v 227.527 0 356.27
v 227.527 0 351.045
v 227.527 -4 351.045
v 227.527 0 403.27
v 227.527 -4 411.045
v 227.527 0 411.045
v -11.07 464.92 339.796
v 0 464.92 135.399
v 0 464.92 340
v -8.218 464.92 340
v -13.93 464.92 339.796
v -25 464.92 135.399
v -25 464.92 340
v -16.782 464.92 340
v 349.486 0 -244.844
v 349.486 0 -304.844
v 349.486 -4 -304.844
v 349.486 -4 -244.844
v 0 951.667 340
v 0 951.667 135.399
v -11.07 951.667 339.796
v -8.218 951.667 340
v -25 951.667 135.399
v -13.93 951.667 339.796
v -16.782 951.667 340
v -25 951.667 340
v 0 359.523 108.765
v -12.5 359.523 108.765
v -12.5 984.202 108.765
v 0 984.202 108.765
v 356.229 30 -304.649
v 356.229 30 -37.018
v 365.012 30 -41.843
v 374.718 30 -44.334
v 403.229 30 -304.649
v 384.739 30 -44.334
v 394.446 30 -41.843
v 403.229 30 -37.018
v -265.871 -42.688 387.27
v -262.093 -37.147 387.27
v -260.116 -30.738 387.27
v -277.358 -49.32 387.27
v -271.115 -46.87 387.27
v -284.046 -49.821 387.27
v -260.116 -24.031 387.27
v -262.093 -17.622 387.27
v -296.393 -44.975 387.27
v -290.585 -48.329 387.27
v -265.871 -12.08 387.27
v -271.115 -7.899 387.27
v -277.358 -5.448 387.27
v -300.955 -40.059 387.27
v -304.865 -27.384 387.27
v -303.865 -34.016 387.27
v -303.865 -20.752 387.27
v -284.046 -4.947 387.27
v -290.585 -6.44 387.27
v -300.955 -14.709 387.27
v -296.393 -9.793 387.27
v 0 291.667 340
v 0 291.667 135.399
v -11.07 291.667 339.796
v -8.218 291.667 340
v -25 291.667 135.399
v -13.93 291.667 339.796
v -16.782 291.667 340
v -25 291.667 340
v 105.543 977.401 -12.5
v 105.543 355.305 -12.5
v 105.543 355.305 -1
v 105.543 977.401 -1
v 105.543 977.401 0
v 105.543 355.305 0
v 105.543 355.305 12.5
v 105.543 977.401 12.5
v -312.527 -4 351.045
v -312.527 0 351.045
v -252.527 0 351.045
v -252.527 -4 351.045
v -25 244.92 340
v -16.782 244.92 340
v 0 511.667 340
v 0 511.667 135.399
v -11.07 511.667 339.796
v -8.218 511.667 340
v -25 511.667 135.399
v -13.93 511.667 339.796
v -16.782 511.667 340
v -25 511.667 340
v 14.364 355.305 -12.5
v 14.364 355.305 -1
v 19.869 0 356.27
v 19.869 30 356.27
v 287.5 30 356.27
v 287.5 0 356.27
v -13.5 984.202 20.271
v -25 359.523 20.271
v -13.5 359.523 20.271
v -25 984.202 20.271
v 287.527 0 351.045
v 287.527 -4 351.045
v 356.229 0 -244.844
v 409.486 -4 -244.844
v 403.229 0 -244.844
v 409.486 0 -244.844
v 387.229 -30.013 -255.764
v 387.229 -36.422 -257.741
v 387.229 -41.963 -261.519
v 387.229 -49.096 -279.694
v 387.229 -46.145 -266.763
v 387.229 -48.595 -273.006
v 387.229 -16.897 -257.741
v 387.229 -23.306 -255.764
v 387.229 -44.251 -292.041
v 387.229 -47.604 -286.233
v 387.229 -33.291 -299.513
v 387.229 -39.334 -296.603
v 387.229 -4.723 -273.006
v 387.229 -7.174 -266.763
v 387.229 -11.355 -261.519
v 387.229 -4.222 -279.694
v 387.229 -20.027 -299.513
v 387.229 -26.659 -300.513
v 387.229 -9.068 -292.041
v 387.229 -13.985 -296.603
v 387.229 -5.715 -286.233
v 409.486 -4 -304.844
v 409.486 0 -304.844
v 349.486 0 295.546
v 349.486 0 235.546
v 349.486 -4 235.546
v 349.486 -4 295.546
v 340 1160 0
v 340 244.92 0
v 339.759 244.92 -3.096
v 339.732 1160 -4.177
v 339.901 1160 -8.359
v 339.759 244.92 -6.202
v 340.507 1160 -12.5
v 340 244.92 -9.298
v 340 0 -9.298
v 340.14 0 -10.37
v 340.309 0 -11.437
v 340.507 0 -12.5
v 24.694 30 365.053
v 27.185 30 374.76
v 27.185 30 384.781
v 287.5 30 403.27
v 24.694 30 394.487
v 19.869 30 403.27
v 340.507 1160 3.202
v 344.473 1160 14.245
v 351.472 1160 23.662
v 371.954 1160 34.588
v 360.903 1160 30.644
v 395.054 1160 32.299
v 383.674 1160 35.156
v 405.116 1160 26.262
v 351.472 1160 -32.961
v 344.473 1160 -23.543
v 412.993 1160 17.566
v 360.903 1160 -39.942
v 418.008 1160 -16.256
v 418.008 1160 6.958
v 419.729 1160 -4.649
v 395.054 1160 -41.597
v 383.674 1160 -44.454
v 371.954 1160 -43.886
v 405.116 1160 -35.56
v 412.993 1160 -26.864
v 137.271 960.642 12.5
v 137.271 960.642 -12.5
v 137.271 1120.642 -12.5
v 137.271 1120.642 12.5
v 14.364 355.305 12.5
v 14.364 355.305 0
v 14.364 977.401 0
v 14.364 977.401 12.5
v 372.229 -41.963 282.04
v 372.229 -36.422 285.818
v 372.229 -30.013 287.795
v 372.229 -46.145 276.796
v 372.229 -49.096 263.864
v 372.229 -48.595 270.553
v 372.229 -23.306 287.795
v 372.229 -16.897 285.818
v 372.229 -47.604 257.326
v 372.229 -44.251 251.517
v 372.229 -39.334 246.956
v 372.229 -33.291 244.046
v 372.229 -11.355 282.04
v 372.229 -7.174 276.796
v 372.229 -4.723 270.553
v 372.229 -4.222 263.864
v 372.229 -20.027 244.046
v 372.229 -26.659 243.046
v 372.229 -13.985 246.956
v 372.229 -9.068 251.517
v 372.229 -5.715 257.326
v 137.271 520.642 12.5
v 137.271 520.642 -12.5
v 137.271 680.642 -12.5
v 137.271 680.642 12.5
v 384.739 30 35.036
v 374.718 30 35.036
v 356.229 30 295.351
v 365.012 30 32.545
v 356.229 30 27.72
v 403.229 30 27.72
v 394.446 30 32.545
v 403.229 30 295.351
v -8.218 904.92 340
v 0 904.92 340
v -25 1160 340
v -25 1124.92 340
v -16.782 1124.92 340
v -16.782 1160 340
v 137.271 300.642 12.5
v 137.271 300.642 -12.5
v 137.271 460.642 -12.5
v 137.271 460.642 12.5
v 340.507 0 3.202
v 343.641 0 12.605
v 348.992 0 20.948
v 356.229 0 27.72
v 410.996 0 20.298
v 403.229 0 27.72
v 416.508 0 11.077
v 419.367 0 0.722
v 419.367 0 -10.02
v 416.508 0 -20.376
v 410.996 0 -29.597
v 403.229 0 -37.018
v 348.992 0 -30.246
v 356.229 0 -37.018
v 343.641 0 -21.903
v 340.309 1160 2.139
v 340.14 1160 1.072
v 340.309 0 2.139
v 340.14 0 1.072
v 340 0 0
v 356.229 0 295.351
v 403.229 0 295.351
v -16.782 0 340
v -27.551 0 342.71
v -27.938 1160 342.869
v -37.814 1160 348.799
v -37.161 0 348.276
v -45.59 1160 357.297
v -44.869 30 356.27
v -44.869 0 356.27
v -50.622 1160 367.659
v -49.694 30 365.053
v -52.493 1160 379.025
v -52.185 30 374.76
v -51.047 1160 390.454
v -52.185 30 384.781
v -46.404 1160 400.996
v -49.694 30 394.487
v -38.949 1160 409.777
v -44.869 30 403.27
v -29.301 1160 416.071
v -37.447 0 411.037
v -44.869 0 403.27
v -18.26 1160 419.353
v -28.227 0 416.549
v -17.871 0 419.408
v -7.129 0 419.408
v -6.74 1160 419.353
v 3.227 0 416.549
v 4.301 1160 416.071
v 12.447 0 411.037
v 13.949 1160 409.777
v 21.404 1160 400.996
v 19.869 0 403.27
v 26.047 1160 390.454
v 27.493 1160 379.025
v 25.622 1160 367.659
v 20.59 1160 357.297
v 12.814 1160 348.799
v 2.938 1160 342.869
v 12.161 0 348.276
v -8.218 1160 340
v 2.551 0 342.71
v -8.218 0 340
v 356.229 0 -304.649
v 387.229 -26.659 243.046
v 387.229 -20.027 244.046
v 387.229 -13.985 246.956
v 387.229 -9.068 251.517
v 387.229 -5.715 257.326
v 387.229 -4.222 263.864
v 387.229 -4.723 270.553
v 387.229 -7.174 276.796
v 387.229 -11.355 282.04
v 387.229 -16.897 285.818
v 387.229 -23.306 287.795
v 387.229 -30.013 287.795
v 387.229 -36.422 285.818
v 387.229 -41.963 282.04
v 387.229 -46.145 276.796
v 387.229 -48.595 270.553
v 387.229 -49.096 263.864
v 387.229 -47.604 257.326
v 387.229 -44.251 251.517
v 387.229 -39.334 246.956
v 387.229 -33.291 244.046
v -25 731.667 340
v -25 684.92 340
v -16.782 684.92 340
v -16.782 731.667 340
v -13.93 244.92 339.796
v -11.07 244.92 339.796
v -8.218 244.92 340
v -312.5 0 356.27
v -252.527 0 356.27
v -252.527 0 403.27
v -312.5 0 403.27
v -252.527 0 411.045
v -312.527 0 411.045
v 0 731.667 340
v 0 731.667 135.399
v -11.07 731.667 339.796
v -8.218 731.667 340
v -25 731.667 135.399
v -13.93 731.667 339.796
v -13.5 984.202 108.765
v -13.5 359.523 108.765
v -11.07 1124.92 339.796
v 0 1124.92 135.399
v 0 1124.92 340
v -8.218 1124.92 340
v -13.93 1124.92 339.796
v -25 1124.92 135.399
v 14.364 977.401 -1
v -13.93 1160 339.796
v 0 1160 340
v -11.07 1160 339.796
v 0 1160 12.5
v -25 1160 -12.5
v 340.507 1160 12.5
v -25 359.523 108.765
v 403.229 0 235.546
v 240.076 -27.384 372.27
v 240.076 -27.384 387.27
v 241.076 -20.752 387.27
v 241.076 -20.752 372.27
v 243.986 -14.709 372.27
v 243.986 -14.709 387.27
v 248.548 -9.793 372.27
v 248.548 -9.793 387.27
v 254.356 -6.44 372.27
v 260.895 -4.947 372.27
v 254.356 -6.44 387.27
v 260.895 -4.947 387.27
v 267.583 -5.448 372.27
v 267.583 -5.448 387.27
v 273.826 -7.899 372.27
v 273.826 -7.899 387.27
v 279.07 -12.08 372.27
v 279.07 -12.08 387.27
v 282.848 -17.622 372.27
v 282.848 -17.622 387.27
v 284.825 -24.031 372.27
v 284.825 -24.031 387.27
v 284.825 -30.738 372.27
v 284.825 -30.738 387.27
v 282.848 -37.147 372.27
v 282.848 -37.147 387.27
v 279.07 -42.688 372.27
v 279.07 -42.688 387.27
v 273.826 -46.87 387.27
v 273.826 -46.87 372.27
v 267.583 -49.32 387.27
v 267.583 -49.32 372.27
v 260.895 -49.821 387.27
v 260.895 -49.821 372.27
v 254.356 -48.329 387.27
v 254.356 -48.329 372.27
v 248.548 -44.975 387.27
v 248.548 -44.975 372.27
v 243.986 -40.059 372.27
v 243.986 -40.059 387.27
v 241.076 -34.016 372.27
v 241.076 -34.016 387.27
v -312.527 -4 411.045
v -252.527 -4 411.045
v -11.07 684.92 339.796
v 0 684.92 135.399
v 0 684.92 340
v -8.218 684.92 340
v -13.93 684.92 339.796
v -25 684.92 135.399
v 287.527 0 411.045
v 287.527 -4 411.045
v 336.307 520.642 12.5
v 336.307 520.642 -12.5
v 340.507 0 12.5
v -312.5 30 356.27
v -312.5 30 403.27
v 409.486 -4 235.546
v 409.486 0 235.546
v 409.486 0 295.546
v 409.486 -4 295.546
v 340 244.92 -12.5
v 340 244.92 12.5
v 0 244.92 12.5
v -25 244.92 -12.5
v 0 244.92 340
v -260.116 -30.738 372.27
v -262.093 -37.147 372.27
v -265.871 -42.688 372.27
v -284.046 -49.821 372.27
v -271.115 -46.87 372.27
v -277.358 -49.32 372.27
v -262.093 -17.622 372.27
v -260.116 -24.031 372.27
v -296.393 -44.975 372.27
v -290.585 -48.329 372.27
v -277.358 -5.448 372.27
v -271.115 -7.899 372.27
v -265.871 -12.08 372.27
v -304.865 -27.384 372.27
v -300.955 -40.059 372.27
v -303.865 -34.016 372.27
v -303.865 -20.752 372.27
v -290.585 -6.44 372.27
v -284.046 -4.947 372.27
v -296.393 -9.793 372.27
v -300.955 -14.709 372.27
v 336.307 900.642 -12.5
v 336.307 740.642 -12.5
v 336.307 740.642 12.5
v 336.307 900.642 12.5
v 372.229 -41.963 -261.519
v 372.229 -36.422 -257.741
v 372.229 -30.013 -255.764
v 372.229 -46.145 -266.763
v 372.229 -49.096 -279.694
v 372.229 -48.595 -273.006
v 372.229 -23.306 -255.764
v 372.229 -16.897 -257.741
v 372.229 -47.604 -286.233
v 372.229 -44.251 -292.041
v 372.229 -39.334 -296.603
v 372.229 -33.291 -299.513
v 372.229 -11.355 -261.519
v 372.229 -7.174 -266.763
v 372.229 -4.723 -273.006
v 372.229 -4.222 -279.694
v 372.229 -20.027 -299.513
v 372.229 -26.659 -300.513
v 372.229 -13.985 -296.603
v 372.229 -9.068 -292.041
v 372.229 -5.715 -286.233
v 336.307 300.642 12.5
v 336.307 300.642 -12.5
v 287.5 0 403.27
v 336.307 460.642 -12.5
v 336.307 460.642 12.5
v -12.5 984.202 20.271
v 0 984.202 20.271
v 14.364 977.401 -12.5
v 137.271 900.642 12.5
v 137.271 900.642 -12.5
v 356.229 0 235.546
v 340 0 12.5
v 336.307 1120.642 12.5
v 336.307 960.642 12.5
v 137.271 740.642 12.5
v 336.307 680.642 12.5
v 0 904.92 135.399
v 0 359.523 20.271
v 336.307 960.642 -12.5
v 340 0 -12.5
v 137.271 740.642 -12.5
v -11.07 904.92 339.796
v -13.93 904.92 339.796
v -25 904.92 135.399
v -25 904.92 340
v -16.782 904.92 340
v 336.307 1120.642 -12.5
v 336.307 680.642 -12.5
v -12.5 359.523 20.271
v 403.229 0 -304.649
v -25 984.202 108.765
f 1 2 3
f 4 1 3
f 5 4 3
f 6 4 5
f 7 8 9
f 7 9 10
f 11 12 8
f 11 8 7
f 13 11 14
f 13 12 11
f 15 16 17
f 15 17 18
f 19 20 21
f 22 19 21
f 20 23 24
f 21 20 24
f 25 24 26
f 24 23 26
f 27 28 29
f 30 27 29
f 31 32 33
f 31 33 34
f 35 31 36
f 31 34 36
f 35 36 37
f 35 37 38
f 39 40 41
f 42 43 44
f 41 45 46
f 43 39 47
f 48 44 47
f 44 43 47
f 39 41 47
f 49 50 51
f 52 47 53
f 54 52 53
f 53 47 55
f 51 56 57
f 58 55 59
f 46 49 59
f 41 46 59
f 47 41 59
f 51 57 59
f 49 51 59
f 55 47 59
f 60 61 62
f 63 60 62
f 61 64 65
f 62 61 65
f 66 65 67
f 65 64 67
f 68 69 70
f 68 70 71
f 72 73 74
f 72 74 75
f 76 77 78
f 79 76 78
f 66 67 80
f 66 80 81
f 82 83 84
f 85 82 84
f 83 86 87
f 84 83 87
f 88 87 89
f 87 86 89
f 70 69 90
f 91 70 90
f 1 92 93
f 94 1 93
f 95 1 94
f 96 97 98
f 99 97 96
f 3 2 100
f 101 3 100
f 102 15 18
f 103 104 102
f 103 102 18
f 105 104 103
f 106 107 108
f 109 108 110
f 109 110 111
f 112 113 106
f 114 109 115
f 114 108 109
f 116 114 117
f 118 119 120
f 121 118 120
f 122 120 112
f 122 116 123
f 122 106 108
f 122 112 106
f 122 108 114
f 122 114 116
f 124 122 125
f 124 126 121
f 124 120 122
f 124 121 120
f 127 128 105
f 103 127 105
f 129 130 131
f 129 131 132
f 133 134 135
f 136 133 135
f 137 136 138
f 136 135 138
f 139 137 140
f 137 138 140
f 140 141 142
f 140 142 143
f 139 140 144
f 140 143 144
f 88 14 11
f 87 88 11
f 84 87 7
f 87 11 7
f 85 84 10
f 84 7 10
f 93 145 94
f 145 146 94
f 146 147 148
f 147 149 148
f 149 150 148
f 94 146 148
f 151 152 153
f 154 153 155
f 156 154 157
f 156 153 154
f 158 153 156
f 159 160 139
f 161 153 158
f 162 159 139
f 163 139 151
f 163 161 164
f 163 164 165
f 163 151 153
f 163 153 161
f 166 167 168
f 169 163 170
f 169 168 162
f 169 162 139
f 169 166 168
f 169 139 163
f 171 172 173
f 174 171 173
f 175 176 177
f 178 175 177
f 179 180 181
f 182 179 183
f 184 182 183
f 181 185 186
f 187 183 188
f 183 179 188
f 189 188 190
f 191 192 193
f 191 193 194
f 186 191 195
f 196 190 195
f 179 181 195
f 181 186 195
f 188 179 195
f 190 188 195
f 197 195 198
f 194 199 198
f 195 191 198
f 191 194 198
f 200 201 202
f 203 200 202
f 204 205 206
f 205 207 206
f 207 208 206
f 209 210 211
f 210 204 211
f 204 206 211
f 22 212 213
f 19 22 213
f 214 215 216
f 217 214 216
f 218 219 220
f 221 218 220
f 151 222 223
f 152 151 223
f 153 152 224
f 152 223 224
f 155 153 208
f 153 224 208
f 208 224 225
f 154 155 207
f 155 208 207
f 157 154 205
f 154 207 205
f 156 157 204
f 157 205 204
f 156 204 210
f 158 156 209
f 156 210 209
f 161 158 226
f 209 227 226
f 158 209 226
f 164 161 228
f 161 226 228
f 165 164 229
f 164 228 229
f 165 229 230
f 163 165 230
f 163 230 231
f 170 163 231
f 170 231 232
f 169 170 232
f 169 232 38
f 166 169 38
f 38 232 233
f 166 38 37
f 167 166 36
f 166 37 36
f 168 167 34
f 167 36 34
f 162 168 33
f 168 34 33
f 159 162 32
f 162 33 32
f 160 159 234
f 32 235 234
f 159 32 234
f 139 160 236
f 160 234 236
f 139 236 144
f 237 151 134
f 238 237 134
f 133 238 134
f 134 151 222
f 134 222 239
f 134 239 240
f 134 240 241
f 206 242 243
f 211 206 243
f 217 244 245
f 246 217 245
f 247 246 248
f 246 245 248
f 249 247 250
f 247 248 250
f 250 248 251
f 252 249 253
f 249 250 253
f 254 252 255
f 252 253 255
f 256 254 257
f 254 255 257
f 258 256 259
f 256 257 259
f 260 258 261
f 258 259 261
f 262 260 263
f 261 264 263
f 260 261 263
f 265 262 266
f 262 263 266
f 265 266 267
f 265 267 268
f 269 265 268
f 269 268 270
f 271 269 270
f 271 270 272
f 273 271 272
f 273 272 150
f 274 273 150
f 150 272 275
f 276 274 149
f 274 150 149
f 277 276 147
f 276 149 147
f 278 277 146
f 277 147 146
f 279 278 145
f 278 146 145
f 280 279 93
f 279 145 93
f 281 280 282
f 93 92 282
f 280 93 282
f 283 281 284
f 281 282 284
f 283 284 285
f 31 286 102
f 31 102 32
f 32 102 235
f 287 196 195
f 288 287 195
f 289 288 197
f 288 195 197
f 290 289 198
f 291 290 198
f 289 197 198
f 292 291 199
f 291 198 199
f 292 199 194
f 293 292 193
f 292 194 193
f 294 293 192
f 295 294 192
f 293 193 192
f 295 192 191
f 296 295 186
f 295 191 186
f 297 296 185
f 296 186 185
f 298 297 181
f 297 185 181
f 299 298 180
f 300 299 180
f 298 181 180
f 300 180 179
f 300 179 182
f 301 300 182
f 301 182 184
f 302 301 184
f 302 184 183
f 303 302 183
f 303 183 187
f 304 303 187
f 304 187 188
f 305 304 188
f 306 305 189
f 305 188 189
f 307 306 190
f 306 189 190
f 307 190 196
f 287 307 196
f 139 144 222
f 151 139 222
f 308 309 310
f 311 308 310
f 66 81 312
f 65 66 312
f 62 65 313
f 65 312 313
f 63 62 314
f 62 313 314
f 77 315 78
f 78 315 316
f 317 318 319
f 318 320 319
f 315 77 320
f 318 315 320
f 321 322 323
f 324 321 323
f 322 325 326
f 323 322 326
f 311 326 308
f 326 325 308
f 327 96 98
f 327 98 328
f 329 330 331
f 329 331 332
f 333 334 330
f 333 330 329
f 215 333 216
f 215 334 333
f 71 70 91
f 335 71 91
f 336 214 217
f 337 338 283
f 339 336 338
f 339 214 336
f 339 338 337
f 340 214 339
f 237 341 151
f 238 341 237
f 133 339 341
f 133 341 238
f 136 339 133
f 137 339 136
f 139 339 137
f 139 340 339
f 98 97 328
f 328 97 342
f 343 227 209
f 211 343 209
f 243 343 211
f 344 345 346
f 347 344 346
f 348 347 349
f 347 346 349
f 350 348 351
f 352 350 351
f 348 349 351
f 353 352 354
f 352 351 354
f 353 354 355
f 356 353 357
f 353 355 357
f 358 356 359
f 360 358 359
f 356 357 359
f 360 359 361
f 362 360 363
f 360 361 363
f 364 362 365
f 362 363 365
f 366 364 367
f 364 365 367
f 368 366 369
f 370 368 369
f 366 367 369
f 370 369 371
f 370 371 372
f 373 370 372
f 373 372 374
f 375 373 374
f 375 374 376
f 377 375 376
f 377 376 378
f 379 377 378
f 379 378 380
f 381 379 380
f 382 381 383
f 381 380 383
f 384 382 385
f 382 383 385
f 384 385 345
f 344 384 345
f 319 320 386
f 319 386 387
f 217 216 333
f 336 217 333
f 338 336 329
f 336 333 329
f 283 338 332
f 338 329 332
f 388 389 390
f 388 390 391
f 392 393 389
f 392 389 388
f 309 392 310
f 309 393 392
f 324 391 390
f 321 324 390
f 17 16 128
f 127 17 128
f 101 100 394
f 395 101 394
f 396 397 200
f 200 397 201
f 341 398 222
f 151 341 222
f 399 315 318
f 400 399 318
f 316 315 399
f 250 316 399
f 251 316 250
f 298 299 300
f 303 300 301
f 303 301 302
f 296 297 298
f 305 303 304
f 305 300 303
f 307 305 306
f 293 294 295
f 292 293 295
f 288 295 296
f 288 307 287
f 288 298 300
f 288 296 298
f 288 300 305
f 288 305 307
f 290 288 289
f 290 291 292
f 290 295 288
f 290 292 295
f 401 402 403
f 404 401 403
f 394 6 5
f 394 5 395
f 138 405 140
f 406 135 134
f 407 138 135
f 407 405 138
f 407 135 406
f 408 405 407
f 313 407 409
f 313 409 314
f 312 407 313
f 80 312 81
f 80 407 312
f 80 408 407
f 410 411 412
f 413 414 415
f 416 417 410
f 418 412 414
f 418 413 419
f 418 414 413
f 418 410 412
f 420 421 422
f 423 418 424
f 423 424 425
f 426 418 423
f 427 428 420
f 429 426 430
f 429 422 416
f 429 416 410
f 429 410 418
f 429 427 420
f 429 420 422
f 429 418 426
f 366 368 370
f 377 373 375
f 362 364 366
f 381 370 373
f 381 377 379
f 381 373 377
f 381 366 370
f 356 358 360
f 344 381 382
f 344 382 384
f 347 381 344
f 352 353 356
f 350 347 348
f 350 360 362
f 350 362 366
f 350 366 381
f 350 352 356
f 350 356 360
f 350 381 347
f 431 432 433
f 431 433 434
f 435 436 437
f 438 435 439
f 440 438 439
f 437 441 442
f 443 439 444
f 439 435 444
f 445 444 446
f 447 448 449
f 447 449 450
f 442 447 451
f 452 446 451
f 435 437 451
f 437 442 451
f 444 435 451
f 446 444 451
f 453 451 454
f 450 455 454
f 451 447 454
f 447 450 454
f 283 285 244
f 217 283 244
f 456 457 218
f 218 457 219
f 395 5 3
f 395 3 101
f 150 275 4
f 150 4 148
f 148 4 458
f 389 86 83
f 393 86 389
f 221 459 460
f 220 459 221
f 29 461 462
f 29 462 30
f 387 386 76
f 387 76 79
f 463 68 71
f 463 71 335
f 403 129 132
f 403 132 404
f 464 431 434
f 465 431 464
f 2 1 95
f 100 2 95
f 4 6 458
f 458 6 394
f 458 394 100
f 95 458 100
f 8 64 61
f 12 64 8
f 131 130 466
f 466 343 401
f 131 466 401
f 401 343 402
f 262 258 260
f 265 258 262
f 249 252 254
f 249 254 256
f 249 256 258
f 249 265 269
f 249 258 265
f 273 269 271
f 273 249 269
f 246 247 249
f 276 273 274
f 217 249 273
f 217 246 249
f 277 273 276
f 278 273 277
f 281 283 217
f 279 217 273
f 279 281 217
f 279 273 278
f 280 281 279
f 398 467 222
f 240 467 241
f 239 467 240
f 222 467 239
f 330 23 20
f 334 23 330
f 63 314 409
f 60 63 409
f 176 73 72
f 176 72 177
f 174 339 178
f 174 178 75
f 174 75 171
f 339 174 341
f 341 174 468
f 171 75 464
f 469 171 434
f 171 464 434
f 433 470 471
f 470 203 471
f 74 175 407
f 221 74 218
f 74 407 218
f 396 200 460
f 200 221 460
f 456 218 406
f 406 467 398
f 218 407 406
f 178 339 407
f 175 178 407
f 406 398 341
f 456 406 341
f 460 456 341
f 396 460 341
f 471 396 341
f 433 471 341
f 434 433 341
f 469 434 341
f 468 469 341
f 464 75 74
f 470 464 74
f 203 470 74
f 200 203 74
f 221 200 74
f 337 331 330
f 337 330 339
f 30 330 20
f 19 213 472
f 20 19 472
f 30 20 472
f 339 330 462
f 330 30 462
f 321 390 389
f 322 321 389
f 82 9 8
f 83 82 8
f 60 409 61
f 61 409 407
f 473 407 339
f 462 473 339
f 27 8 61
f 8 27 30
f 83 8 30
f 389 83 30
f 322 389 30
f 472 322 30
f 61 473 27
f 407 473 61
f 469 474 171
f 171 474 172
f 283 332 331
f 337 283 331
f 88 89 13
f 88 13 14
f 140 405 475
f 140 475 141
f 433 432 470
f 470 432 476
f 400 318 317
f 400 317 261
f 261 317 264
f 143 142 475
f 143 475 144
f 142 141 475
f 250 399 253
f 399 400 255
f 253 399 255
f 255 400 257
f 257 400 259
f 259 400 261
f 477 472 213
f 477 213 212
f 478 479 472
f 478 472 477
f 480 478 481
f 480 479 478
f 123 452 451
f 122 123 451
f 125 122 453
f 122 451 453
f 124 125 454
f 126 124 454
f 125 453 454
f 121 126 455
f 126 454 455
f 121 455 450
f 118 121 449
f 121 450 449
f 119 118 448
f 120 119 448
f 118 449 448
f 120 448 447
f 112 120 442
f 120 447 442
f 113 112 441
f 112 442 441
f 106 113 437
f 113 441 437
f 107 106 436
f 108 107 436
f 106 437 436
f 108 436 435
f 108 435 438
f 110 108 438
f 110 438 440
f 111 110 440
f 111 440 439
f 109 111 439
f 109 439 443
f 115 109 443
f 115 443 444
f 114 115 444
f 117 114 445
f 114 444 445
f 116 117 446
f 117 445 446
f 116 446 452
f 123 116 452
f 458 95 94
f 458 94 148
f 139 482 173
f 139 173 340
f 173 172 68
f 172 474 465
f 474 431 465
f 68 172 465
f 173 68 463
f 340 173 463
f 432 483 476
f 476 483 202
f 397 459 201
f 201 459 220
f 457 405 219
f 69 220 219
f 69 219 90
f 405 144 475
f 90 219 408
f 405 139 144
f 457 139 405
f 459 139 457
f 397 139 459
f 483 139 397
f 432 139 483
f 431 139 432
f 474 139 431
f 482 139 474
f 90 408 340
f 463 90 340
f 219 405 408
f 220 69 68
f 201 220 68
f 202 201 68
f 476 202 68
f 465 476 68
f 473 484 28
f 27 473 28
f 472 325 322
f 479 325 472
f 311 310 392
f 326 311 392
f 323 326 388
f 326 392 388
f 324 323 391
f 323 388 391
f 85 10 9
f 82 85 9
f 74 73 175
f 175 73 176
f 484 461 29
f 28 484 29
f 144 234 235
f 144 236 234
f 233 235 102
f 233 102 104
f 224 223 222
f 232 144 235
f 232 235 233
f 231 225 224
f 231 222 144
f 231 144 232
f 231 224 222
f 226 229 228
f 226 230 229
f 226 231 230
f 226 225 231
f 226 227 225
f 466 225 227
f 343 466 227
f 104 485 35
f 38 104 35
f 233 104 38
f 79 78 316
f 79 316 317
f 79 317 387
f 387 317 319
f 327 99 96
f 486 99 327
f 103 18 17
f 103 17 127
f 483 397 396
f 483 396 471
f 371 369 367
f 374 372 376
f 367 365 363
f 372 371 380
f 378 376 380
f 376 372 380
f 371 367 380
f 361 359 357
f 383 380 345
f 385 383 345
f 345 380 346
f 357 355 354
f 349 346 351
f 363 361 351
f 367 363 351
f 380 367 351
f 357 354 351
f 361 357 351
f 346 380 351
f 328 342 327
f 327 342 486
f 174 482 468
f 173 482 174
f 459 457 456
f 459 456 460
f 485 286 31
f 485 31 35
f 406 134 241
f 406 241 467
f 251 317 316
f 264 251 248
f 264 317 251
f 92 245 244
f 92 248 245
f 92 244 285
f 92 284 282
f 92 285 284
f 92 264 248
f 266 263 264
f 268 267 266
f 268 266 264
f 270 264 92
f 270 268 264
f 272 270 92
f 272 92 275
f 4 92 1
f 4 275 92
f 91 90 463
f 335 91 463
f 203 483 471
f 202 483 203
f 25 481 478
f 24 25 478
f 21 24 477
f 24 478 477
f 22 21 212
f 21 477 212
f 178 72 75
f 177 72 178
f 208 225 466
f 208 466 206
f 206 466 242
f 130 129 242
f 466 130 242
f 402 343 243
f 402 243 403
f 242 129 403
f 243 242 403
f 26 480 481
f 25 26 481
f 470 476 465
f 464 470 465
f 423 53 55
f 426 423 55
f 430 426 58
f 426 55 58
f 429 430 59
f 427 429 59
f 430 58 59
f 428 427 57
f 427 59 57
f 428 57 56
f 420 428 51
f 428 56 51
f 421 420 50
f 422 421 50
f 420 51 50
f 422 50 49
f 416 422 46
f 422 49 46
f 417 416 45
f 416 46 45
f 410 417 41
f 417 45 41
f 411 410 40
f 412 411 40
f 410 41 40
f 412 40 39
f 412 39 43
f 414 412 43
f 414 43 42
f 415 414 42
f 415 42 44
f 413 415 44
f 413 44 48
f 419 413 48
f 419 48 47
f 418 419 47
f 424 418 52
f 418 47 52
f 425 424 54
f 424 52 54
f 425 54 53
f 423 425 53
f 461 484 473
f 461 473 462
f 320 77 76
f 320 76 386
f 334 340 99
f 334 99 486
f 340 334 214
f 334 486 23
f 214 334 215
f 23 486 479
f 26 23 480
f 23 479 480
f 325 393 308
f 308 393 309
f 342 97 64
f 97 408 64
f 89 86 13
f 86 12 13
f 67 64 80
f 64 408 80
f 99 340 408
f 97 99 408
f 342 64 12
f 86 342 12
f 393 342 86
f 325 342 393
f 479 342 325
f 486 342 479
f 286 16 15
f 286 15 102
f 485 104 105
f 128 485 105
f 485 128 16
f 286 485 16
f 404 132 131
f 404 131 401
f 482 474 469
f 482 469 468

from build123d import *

# Parameters (mm, degrees)
SALIENTE_EXTRUIR1_DEPTH        = 1160
SALIENTE_EXTRUIR1_2_DEPTH      = 1160
SALIENTE_EXTRUIR1_3_DEPTH      = 1160
CROQUIS2_W                     = 204.601269718
CROQUIS2_H                     = 173.253526092
CORTAR_EXTRUIR1_DEPTH          = 150
MATRIZL1_COUNT                 = 5
MATRIZL1_PITCH                 = 220
CROQUIS3_W                     = 88.493917932
CROQUIS3_H                     = 624.678517467
CORTAR_EXTRUIR3_DEPTH          = 150
CROQUIS4_W                     = 91.178394865
CROQUIS4_H                     = 622.095660422
CORTAR_EXTRUIR4_DEPTH          = 150
CROQUIS5_W                     = 352.5
CROQUIS5_H                     = 244.920139752
CORTAR_EXTRUIR5_DEPTH          = 365
CROQUIS6_W                     = 199.035720847
CROQUIS6_H                     = 160
CORTAR_EXTRUIR6_DEPTH          = 365
MATRIZL2_COUNT                 = 4
MATRIZL2_PITCH                 = 220
CROQUIS7_W                     = 91.178394865
CROQUIS7_H                     = 622.095660422
SALIENTE_EXTRUIR2_DEPTH        = 1
CROQUIS8_W                     = 88.493917932
CROQUIS8_H                     = 624.678517467
SALIENTE_EXTRUIR3_DEPTH        = 1
CROQUIS9_W                     = 47
CROQUIS9_H                     = 600
CROQUIS9_W_2                   = 600
CROQUIS9_H_2                   = 47
SALIENTE_EXTRUIR4_DEPTH        = 30
CROQUIS10_W                    = 60
CROQUIS10_H                    = 60
SALIENTE_EXTRUIR5_DEPTH        = 4
SALIENTE_EXTRUIR6_DEPTH        = 7.5
SALIENTE_EXTRUIR6_DEPTH_BACK   = 7.5
CROQUIS11_R                    = 22.5
SALIENTE_EXTRUIR6_2_DEPTH      = 7.5
SALIENTE_EXTRUIR6_2_DEPTH_BACK = 7.5
SALIENTE_EXTRUIR7_DEPTH        = 7.5
SALIENTE_EXTRUIR7_DEPTH_BACK   = 7.5
CROQUIS12_R                    = 22.5
SALIENTE_EXTRUIR7_2_DEPTH      = 7.5
SALIENTE_EXTRUIR7_2_DEPTH_BACK = 7.5


with BuildPart() as part:
    # Croquis1 → Saliente-Extruir1 (new body)
    with BuildSketch(Plane(origin=(0, 0, 0), x_dir=(1, 0, 0), z_dir=(0, 1, 0))):
        with BuildLine():
            Line((0, -340), (0, -12.5))
            Line((0, -12.5), (340.50692706, -12.5))
            Line((340.50692706, -12.5), (340.50692706, -3.20178703))
            ThreePointArc((340.50692706, -3.20178703), (340.221015416, -1.606030904), (340, 0))
            ThreePointArc((340, 0), (339.761756236, 6.269940779), (340.50692706, 12.5))
            Line((340.50692706, 12.5), (-25, 12.5))
            Line((-25, 12.5), (-25, -340))
            Line((-25, -340), (-16.782024574, -340))
            ThreePointArc((-16.782024574, -340), (-12.5, -339.770142891), (-8.217975426, -340))
            Line((-8.217975426, -340), (0, -340))
        make_face()
    extrude(amount=SALIENTE_EXTRUIR1_DEPTH)

    # Croquis2 → Cortar-Extruir1 (cut)
    with BuildSketch(Plane.ZY.offset(25)):
        with Locations((237.699365141, 1038.293376706)):
            Rectangle(CROQUIS2_W, CROQUIS2_H)
    cortar_extruir1 = extrude(amount=-CORTAR_EXTRUIR1_DEPTH, mode=Mode.SUBTRACT)

    # MatrizL1: Cortar-Extruir1 ×5
    with Locations(*[(0, -i * MATRIZL1_PITCH, 0) for i in range(1, MATRIZL1_COUNT)]):
        add(cortar_extruir1, mode=Mode.SUBTRACT)

    # Croquis3 → Cortar-Extruir3 (cut)
    with BuildSketch(Plane.ZY.offset(25)):
        with Locations((64.518154315, 671.862661026)):
            Rectangle(CROQUIS3_W, CROQUIS3_H)
    extrude(amount=-CORTAR_EXTRUIR3_DEPTH, mode=Mode.SUBTRACT)

    # Croquis4 → Cortar-Extruir4 (cut)
    with BuildSketch(Plane(origin=(0, 0, -12.5), x_dir=(-1, 0, 0), z_dir=(0, 0, -1))):
        with Locations((-59.953539945, 666.353095055)):
            Rectangle(CROQUIS4_W, CROQUIS4_H)
    extrude(amount=-CORTAR_EXTRUIR4_DEPTH, mode=Mode.SUBTRACT)

    # Croquis5 → Cortar-Extruir5 (cut)
    with BuildSketch(Plane.ZY.offset(25)):
        with Locations((163.75, 122.460069876)):
            Rectangle(CROQUIS5_W, CROQUIS5_H)
    extrude(amount=-CORTAR_EXTRUIR5_DEPTH, mode=Mode.SUBTRACT)

    # Croquis6 → Cortar-Extruir6 (cut)
    with BuildSketch(Plane(origin=(0, 0, -12.5), x_dir=(-1, 0, 0), z_dir=(0, 0, -1))):
        with Locations((-236.788797545, 1040.641633994)):
            Rectangle(CROQUIS6_W, CROQUIS6_H)
    cortar_extruir6 = extrude(amount=-CORTAR_EXTRUIR6_DEPTH, mode=Mode.SUBTRACT)

    # MatrizL2: Cortar-Extruir6 ×4
    with Locations(*[(0, -i * MATRIZL2_PITCH, 0) for i in range(1, MATRIZL2_COUNT)]):
        add(cortar_extruir6, mode=Mode.SUBTRACT)

    # Croquis7 → Saliente-Extruir2 (add)
    with BuildSketch(Plane(origin=(0, 0, 0), x_dir=(-1, 0, 0), z_dir=(0, 0, -1))):
        with Locations((-59.953539945, 666.353095055)):
            Rectangle(CROQUIS7_W, CROQUIS7_H)
    extrude(amount=SALIENTE_EXTRUIR2_DEPTH)

    # Croquis8 → Saliente-Extruir3 (add)
    with BuildSketch(Plane.ZY.offset(12.5)):
        with Locations((64.518154315, 671.862661026)):
            Rectangle(CROQUIS8_W, CROQUIS8_H)
    extrude(amount=SALIENTE_EXTRUIR3_DEPTH)


with BuildPart() as body_2:
    # Croquis1 → Saliente-Extruir1 2 (new body)
    with BuildSketch(Plane(origin=(0, 0, 0), x_dir=(1, 0, 0), z_dir=(0, 1, 0))):
        with BuildLine():
            Line((340.50692706, 12.5), (340.50692706, -3.20178703))
            ThreePointArc((340.50692706, -3.20178703), (419.728903948, 4.649106485), (340.50692706, 12.5))
        make_face()
    extrude(amount=SALIENTE_EXTRUIR1_2_DEPTH)



with BuildPart() as body_3:
    # Croquis1 → Saliente-Extruir1 3 (new body)
    with BuildSketch(Plane(origin=(0, 0, 0), x_dir=(1, 0, 0), z_dir=(0, 1, 0))):
        with BuildLine():
            ThreePointArc((-16.782024574, -340), (-12.5, -419.770142891), (-8.217975426, -340))
            Line((-8.217975426, -340), (-16.782024574, -340))
        make_face()
    extrude(amount=SALIENTE_EXTRUIR1_3_DEPTH)


with BuildPart() as body_2_1:
    add(body_2.part)

    add(body_3.part)  # Saliente-Extruir4 merges body 3
    # Croquis9 → Saliente-Extruir4 (add)
    with BuildSketch(Plane.XZ):
        with Locations((379.728903948, -4.649106485)):
            Rectangle(CROQUIS9_W, CROQUIS9_H)
        with Locations((-12.5, 379.770142891)):
            Rectangle(CROQUIS9_W_2, CROQUIS9_H_2)
    extrude(amount=-SALIENTE_EXTRUIR4_DEPTH)

    # Croquis10 → Saliente-Extruir5 (add)
    with BuildSketch(Plane.XZ):
        with Locations((257.527448142, 381.045288358)):
            Rectangle(CROQUIS10_W, CROQUIS10_H)
        with Locations((-282.527448142, 381.045288358)):
            Rectangle(CROQUIS10_W, CROQUIS10_H)
        with Locations((379.48572828, 265.545919849)):
            Rectangle(CROQUIS10_W, CROQUIS10_H)
        with Locations((379.48572828, -274.844132819)):
            Rectangle(CROQUIS10_W, CROQUIS10_H)
    extrude(amount=SALIENTE_EXTRUIR5_DEPTH)


with BuildPart() as body_3_2:
    # Croquis11 → Saliente-Extruir6 (new, two sides: drawn at the far end of the back side and taken through both)
    with BuildSketch(Plane(origin=(0, 0, 379.770142891), x_dir=(-1, 0, 0), z_dir=(0, 0, -1)).offset(-SALIENTE_EXTRUIR6_DEPTH_BACK)):
        with Locations((282.364653356, -27.384163756)):
            Circle(CROQUIS11_R)
    extrude(amount=SALIENTE_EXTRUIR6_DEPTH + SALIENTE_EXTRUIR6_DEPTH_BACK)


with BuildPart() as body_4:
    # Croquis11 → Saliente-Extruir6 2 (new, two sides: drawn at the far end of the back side and taken through both)
    with BuildSketch(Plane(origin=(0, 0, 379.770142891), x_dir=(-1, 0, 0), z_dir=(0, 0, -1)).offset(-SALIENTE_EXTRUIR6_2_DEPTH_BACK)):
        with Locations((-262.576426654, -27.384163756)):
            Circle(CROQUIS11_R)
    extrude(amount=SALIENTE_EXTRUIR6_2_DEPTH + SALIENTE_EXTRUIR6_2_DEPTH_BACK)


with BuildPart() as body_5:
    # Croquis12 → Saliente-Extruir7 (new, two sides: drawn at the far end of the back side and taken through both)
    with BuildSketch(Plane(origin=(379.728903948, 0, 0), x_dir=(0, 0, -1), z_dir=(1, 0, 0)).offset(-SALIENTE_EXTRUIR7_DEPTH_BACK)):
        with Locations((-265.545919849, -26.659325153)):
            Circle(CROQUIS12_R)
    extrude(amount=SALIENTE_EXTRUIR7_DEPTH + SALIENTE_EXTRUIR7_DEPTH_BACK)


with BuildPart() as body_6:
    # Croquis12 → Saliente-Extruir7 2 (new, two sides: drawn at the far end of the back side and taken through both)
    with BuildSketch(Plane(origin=(379.728903948, 0, 0), x_dir=(0, 0, -1), z_dir=(1, 0, 0)).offset(-SALIENTE_EXTRUIR7_2_DEPTH_BACK)):
        with Locations((278.01297899, -26.659325153)):
            Circle(CROQUIS12_R)
    extrude(amount=SALIENTE_EXTRUIR7_2_DEPTH + SALIENTE_EXTRUIR7_2_DEPTH_BACK)


solid = Compound([part.part, body_2_1.part, body_3_2.part, body_4.part, body_5.part, body_6.part])
